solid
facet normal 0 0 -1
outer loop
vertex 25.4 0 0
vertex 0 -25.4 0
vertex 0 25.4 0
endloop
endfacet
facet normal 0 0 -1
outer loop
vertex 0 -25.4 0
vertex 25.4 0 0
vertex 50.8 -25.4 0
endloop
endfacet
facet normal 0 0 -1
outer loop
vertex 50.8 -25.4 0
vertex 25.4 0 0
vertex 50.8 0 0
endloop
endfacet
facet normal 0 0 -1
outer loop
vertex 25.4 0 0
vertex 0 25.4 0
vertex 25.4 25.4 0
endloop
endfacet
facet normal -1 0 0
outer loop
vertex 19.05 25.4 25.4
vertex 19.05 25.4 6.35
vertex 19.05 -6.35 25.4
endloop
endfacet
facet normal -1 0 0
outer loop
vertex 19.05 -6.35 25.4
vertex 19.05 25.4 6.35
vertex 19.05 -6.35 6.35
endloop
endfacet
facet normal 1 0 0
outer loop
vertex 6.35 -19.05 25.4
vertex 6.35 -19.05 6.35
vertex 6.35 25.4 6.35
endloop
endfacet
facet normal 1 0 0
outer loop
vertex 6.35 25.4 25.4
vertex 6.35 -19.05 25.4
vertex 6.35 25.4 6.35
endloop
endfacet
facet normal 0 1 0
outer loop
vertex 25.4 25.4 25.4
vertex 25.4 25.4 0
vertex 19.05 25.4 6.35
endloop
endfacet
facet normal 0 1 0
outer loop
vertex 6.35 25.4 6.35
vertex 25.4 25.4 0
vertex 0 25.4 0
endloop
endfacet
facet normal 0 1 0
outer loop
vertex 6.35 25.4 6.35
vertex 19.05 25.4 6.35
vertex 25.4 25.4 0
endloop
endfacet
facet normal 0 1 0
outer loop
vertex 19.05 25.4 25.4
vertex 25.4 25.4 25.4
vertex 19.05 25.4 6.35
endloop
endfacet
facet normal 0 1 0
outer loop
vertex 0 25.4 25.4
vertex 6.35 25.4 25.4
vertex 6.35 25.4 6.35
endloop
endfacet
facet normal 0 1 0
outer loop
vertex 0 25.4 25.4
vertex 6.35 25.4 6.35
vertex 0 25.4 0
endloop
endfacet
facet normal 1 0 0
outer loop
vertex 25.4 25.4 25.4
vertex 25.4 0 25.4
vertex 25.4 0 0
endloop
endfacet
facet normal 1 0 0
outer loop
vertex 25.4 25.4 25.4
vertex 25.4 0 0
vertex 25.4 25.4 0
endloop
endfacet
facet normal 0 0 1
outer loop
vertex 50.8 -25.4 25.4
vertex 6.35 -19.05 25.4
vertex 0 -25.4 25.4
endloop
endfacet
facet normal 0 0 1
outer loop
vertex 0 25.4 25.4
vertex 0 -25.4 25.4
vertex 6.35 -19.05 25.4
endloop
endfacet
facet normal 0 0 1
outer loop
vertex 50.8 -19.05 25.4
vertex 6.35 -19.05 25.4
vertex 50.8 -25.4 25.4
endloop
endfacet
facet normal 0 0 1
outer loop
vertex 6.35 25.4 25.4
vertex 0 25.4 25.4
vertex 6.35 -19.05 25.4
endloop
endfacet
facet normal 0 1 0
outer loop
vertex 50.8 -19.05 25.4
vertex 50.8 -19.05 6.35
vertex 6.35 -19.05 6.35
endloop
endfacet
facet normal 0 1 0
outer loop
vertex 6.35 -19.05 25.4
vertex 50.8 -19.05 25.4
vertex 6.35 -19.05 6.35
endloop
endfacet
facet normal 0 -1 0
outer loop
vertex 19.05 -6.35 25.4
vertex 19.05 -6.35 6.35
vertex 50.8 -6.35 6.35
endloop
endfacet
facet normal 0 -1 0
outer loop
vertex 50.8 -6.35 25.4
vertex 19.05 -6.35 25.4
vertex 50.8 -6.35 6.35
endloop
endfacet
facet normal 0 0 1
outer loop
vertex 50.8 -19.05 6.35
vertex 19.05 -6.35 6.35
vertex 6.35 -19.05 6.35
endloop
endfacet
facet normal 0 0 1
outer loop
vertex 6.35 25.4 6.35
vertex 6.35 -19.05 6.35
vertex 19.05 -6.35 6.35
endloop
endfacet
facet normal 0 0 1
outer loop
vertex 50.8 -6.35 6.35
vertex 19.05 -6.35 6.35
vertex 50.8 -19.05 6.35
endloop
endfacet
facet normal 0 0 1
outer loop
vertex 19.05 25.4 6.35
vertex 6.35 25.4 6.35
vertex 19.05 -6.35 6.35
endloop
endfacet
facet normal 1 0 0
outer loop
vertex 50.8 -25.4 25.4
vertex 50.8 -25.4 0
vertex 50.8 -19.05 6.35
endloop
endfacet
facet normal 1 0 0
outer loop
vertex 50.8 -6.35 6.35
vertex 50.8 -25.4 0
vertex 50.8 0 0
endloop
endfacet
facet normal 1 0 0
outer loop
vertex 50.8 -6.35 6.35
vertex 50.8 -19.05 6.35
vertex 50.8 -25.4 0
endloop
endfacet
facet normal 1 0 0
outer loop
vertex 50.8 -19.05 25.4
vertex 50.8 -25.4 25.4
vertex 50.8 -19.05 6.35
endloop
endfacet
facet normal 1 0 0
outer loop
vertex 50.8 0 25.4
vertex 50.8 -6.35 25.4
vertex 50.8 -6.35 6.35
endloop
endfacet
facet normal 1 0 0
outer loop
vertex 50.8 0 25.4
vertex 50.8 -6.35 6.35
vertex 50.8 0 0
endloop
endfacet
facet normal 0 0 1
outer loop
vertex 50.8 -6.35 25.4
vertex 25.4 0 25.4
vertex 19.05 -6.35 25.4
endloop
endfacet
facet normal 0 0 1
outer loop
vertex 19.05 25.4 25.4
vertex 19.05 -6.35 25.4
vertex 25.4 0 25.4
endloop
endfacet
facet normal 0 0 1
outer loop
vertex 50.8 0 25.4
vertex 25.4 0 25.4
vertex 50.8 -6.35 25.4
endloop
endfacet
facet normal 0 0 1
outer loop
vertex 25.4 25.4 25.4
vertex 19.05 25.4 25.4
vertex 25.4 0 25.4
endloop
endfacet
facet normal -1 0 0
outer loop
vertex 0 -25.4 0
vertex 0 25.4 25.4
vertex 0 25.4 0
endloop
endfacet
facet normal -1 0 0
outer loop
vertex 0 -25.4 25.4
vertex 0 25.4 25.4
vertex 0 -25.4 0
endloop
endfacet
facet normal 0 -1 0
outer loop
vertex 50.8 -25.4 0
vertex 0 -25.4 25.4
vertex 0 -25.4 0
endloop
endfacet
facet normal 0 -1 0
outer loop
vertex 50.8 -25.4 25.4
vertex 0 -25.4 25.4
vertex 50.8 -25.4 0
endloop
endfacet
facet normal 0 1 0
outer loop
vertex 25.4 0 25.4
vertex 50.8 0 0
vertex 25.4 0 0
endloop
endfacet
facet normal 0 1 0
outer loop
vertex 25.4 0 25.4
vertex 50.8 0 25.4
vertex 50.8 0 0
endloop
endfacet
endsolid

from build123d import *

# Parameters (mm, degrees)
F1_DEPTH = 19.05
F2_DEPTH = 6.35


with BuildPart() as f1:
    # F0 (on Top) → F1 (new body)
    with BuildSketch(Plane.XY):
        Polygon((50.8, 0), (25.4, 0), (25.4, 25.4), (19.05, 25.4), (19.05, -6.35), (50.8, -6.35), align=None)
    extrude(amount=F1_DEPTH)



with BuildPart() as f1b:
    # F0 (on Top) → F1, piece 2 (new body)
    with BuildSketch(Plane.XY):
        Polygon((50.8, -25.4), (50.8, -19.05), (6.35, -19.05), (6.35, 25.4), (0, 25.4), (0, 0), (0, -25.4), (25.4, -25.4), align=None)
    extrude(amount=F1_DEPTH)


with BuildPart() as f1_1:
    add(f1.part)

    add(f1b.part)  # F2 merges F1b
    # F0 (on Top) → F2 (join)
    with BuildSketch(Plane.XY):
        Polygon((50.8, -19.05), (50.8, -6.35), (19.05, -6.35), (19.05, 25.4), (6.35, 25.4), (6.35, -19.05), align=None)
        Polygon((50.8, 0), (25.4, 0), (25.4, 25.4), (19.05, 25.4), (19.05, -6.35), (50.8, -6.35), align=None)
        Polygon((50.8, -25.4), (50.8, -19.05), (6.35, -19.05), (6.35, 25.4), (0, 25.4), (0, 0), (0, -25.4), (25.4, -25.4), align=None)
    extrude(amount=-F2_DEPTH)


with BuildPart() as f1_2:
    # F3: moved
    add(f1_1.part.moved(Location((0, 0, 6.35))))


solid = f1_2.part
